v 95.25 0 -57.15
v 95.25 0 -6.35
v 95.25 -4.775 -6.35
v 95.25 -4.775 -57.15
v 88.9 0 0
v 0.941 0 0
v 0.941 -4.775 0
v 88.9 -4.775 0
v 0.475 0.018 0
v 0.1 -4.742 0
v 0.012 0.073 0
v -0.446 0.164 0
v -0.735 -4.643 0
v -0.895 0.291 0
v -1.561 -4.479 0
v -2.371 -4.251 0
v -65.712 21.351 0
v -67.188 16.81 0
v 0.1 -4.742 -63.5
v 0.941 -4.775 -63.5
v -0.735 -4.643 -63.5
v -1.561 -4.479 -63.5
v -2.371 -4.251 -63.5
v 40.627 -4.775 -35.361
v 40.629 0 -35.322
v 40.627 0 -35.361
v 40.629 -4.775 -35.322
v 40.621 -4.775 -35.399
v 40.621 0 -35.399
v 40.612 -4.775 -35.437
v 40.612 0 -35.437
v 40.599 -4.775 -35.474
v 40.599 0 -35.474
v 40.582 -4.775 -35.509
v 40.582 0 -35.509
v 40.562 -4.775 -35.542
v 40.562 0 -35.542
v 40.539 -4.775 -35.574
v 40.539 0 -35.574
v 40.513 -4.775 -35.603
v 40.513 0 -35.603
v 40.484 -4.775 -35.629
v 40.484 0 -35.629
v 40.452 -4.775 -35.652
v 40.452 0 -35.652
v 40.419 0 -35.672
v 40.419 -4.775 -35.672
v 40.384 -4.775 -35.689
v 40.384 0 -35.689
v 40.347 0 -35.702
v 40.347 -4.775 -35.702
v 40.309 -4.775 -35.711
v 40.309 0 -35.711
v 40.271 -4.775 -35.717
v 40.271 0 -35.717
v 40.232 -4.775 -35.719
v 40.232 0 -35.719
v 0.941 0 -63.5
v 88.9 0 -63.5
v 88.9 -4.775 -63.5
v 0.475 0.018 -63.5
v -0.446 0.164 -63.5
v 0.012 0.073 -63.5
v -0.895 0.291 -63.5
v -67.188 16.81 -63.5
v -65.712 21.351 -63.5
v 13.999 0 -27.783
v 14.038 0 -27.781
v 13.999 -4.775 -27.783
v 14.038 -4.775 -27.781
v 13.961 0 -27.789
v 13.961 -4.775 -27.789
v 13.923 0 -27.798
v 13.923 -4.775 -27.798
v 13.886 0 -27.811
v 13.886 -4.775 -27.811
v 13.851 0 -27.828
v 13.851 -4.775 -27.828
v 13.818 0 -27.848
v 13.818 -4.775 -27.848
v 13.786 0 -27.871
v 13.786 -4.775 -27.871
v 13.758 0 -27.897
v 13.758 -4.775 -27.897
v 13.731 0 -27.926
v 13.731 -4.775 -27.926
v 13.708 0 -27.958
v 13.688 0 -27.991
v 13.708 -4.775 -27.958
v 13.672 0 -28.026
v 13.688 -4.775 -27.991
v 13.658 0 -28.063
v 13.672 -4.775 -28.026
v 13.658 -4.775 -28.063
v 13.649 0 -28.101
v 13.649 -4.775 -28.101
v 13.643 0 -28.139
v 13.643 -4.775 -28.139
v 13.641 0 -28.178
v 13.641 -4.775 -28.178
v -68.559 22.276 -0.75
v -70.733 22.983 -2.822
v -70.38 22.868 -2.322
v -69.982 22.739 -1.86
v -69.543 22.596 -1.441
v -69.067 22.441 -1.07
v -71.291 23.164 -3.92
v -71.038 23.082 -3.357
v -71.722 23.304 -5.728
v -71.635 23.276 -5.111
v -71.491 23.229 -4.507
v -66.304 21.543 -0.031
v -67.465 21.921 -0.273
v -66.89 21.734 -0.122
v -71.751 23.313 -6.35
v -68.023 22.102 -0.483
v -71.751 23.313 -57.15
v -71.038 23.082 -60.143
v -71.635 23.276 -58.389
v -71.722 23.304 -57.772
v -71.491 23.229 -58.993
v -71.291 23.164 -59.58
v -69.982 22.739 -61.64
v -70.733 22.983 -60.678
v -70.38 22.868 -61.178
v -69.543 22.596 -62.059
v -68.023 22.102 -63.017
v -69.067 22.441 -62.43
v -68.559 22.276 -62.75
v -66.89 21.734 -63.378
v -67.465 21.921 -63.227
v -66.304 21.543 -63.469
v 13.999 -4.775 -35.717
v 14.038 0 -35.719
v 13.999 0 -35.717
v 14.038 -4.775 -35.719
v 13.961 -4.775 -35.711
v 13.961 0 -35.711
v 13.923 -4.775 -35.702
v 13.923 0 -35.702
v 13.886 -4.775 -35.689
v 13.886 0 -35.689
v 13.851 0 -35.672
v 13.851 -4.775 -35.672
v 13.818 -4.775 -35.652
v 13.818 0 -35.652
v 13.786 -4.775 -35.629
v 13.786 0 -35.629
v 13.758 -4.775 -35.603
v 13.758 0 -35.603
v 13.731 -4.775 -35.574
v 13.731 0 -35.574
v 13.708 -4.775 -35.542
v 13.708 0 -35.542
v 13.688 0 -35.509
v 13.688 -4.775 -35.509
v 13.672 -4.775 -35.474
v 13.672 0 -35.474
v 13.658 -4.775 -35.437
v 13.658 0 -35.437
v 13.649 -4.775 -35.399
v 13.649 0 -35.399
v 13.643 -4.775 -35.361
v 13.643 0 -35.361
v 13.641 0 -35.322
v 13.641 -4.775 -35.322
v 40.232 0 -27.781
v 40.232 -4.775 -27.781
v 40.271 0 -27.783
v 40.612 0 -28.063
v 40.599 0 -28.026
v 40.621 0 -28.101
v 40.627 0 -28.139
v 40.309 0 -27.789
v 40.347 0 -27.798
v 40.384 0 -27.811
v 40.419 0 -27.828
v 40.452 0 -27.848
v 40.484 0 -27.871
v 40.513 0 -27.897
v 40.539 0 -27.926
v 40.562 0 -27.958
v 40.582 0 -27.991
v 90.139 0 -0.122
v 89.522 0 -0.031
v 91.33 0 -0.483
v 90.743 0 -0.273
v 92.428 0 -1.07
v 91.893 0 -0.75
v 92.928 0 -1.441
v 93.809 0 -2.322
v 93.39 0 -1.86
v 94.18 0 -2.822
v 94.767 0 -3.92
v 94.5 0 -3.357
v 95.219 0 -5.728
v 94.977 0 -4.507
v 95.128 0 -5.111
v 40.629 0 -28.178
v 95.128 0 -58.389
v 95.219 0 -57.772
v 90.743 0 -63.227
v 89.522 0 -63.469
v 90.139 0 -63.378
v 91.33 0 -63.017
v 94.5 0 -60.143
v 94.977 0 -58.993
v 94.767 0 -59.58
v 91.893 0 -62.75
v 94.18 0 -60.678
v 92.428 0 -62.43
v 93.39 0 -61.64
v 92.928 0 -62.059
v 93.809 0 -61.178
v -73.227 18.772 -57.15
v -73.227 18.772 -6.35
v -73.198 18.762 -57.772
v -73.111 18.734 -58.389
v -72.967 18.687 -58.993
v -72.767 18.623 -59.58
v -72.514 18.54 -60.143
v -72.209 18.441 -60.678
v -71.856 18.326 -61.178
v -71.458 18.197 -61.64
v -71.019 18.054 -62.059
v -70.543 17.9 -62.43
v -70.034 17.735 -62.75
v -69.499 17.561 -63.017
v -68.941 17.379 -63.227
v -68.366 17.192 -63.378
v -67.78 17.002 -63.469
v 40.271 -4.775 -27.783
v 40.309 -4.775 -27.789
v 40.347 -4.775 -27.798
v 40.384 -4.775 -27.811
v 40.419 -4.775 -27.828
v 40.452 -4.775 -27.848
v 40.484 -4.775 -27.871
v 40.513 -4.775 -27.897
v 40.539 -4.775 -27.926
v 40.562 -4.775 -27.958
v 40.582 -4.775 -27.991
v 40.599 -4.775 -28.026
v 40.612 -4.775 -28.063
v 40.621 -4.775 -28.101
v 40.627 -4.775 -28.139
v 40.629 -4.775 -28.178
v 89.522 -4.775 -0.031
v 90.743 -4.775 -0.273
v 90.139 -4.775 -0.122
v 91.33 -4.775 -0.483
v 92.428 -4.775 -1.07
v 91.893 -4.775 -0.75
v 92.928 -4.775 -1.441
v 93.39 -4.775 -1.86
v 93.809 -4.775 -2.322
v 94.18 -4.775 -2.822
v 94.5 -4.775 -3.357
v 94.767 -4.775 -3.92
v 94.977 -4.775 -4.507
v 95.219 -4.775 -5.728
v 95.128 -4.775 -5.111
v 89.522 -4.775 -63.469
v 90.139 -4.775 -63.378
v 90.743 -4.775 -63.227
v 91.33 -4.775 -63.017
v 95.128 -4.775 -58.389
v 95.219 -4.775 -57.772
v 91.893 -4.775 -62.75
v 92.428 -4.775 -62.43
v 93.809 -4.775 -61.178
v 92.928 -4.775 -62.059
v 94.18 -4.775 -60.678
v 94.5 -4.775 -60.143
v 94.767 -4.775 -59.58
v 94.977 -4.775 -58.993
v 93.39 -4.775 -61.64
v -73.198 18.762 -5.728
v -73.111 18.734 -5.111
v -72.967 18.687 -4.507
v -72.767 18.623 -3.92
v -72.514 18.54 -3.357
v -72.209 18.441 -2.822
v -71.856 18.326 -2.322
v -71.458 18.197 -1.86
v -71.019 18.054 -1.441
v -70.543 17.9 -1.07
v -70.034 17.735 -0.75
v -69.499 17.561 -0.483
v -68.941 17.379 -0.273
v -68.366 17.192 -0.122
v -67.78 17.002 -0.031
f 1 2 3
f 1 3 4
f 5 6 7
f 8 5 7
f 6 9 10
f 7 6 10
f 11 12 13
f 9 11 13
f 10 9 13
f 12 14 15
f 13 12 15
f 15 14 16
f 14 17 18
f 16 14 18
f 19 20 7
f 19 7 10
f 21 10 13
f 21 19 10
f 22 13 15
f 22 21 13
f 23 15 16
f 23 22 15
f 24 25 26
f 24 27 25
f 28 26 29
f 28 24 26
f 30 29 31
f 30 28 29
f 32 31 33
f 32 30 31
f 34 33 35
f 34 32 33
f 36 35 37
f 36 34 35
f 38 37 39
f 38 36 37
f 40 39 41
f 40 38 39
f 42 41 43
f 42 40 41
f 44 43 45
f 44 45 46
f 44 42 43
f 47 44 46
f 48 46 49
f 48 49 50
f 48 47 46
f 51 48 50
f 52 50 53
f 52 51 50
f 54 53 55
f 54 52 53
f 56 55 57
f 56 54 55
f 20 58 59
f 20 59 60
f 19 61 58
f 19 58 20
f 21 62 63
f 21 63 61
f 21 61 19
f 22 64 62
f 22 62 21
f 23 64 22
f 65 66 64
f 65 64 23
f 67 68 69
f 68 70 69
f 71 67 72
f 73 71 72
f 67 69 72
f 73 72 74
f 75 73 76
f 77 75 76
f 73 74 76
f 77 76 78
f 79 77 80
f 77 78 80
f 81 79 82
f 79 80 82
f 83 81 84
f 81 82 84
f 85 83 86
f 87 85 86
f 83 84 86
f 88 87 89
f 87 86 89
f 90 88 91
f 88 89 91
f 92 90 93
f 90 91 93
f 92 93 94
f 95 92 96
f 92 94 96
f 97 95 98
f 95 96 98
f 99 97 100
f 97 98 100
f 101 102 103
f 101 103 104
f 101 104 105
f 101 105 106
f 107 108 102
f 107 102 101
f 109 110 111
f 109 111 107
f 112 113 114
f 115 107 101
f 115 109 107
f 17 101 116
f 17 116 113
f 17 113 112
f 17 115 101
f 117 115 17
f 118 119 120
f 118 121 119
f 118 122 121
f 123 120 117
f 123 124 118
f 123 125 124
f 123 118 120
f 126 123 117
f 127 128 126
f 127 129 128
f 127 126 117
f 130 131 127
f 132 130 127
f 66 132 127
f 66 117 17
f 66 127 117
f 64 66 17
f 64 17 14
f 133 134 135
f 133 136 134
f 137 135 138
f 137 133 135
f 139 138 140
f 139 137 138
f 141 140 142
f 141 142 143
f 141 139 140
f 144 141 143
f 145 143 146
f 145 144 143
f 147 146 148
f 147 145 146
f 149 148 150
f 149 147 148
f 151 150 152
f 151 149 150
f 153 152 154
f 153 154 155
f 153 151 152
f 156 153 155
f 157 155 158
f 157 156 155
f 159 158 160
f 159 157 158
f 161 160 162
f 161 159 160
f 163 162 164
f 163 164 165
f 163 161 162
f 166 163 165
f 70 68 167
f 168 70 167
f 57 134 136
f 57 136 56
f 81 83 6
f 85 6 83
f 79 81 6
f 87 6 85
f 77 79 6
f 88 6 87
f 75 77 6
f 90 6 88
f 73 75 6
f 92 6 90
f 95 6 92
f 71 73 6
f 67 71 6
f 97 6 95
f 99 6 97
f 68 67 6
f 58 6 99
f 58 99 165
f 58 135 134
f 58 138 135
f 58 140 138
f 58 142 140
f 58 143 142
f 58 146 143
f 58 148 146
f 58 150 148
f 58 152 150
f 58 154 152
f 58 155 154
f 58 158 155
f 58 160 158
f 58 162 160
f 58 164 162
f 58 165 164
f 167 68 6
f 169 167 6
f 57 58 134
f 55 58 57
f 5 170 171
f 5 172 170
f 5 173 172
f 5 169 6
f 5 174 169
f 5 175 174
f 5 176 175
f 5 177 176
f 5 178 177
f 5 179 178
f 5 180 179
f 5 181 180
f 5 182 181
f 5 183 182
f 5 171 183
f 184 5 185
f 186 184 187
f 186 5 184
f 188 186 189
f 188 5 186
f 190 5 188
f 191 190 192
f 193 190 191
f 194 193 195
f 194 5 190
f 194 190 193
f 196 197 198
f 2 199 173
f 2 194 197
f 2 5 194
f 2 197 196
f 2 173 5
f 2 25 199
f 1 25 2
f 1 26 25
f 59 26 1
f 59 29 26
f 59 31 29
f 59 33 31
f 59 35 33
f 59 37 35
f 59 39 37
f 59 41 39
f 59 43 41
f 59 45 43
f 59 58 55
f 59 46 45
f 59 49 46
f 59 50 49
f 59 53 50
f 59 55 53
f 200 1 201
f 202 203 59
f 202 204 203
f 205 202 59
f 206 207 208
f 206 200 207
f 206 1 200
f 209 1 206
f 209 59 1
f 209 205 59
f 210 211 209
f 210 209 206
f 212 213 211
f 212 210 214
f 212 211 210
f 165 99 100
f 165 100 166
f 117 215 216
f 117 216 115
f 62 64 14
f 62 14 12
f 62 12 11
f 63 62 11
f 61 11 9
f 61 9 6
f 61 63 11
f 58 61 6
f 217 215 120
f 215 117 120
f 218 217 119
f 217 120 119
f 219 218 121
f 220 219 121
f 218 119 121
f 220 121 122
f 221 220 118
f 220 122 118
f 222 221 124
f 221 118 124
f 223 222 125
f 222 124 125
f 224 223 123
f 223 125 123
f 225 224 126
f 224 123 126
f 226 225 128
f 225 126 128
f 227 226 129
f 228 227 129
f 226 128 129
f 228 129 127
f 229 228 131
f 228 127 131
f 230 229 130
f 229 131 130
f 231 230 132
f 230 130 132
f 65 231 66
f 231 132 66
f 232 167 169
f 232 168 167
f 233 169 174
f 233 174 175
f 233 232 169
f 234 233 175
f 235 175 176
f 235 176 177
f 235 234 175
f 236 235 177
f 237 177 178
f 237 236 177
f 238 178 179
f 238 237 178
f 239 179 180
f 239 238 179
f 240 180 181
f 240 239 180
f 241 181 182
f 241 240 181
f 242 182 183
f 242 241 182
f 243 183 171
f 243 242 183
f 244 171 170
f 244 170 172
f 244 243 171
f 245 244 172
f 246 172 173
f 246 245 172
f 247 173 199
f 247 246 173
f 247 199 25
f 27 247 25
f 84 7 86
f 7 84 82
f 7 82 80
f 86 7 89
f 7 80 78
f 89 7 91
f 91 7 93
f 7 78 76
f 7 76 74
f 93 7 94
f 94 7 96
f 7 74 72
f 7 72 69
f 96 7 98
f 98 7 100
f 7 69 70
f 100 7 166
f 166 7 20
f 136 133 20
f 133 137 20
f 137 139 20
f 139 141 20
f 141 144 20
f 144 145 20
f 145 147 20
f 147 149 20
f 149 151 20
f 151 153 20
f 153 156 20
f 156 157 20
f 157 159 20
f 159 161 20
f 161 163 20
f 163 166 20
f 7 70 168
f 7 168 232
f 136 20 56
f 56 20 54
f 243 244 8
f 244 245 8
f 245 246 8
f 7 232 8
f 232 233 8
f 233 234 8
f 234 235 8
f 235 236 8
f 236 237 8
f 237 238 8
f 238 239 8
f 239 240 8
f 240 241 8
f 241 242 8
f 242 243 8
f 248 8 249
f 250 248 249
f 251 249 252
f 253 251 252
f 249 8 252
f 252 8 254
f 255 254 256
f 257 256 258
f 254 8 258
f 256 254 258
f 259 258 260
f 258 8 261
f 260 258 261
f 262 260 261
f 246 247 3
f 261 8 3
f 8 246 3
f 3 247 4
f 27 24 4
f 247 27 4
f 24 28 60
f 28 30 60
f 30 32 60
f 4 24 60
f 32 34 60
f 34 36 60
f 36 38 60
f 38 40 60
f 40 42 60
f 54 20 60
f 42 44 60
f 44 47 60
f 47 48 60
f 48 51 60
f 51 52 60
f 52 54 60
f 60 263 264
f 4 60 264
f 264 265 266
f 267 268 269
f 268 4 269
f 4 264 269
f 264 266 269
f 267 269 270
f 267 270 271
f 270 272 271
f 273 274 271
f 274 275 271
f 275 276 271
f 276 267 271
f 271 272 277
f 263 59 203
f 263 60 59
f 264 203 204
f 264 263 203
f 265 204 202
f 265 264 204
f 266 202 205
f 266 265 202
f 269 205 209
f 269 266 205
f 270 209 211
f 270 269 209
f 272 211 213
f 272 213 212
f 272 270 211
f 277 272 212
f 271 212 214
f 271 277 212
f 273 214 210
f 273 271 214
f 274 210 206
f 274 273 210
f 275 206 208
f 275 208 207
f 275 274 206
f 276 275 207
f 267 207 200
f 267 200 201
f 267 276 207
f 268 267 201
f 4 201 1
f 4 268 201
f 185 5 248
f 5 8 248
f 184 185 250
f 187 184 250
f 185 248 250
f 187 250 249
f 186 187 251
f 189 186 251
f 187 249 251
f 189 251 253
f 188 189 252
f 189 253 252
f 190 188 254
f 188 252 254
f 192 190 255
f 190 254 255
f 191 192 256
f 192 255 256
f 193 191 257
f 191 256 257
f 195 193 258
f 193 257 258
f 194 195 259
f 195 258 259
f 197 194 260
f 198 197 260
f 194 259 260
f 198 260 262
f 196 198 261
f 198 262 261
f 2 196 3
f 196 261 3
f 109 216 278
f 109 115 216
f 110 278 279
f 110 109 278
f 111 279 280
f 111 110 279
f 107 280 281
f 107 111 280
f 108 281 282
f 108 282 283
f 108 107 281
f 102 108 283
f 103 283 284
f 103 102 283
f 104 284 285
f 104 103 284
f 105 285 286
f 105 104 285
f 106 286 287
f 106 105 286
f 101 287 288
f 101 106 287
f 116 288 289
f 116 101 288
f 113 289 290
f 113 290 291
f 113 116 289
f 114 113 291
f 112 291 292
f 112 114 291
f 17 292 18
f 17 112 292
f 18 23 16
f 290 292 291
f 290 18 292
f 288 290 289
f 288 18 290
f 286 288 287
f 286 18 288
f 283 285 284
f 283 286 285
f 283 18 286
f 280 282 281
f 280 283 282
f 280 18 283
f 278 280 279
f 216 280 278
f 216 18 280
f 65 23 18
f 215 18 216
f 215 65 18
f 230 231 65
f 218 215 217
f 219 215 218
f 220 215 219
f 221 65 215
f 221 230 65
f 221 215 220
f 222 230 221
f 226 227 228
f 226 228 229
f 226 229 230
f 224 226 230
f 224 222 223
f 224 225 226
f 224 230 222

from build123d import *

# Parameters (mm, degrees)
SKETCH2_W                    = 95.25
SKETCH2_H                    = 63.5
BASE_FLANGE1_DEPTH           = 4.7752
EDGE_FLANGE1_STRIP_CUT_DEPTH = 63.5
EDGE_FLANGE1_DEPTH           = 63.5
FILLET1_R                    = 6.35
SKETCH10_W                   = 26.9875
SKETCH10_H                   = 7.9375
CUT_EXTRUDE1_DEPTH           = 117.826050987
FILLET2_R                    = 0.396875


# Sheet-metal steps are written as plain solids
with BuildPart() as part:
    # Sketch2 → Base-Flange1 (new body)
    with BuildSketch(Plane(origin=(0, 0, 0), x_dir=(1, 0, 0), z_dir=(0, 1, 0))):
        with Locations((47.625, 31.75)):
            Rectangle(SKETCH2_W, SKETCH2_H)
    extrude(amount=-BASE_FLANGE1_DEPTH)

    # Edge-Flange1 strip (across the edge) → Edge-Flange1 strip cut (cut)
    with BuildSketch(Plane(origin=(0, 0, -63.5), x_dir=(0.3090169943749416, 0.9510565162951554, 0), z_dir=(0, 0, 1))):
        Polygon((-13.826403209, 27.100421727), (-4.250584587, -2.3709176), (0.29090049, -0.895299648), (-9.284918132, 28.576039679), align=None)
    extrude(amount=EDGE_FLANGE1_STRIP_CUT_DEPTH, mode=Mode.SUBTRACT)

    # Edge-Flange1 section (across the edge) → Edge-Flange1 (add)
    with BuildSketch(Plane(origin=(0, 0, -63.5), x_dir=(0.3090169943749416, 0.9510565162951554, 0), z_dir=(0, 0, 1))):
        with BuildLine():
            Line((-4.7752, 0.94137376), (-4.7752, 75.443682621))
            Line((-4.7752, 75.443682621), (0, 75.443682621))
            Line((0, 75.443682621), (0, 0.94137376))
            ThreePointArc((0, 0.94137376), (0.073175579, 0.011589873), (0.29090049, -0.895299648))
            Line((0.29090049, -0.895299648), (-4.250584587, -2.3709176))
            ThreePointArc((-4.250584587, -2.3709176), (-4.643233785, -0.735415984), (-4.7752, 0.94137376))
        make_face()
    extrude(amount=EDGE_FLANGE1_DEPTH)

    # Fillet1
    fillet1_edges = [part.edges().sort_by_distance(p)[0] for p in [
        (-72.489014945, 21.04263751, -63.5),
        (-72.489014945, 21.04263751, 0),
        (95.25, -2.3876, -63.5),
        (95.25, -2.3876, 0),
    ]]
    fillet(fillet1_edges, radius=FILLET1_R)

    # Sketch10 → Cut-Extrude1 (cut, through all)
    with BuildSketch(Plane(origin=(0, 0, 0), x_dir=(1, 0, 0), z_dir=(0, 1, 0))):
        with Locations((27.13512376, 31.75)):
            Rectangle(SKETCH10_W, SKETCH10_H)
    extrude(amount=-CUT_EXTRUDE1_DEPTH, mode=Mode.SUBTRACT)

    # Fillet2
    fillet2_edges = [part.edges().sort_by_distance(p)[0] for p in [
        (13.64137376, -2.3876, -27.78125),
        (13.64137376, -2.3876, -35.71875),
        (40.62887376, -2.3876, -35.71875),
        (40.62887376, -2.3876, -27.78125),
    ]]
    fillet(fillet2_edges, radius=FILLET2_R)


solid = part.part
